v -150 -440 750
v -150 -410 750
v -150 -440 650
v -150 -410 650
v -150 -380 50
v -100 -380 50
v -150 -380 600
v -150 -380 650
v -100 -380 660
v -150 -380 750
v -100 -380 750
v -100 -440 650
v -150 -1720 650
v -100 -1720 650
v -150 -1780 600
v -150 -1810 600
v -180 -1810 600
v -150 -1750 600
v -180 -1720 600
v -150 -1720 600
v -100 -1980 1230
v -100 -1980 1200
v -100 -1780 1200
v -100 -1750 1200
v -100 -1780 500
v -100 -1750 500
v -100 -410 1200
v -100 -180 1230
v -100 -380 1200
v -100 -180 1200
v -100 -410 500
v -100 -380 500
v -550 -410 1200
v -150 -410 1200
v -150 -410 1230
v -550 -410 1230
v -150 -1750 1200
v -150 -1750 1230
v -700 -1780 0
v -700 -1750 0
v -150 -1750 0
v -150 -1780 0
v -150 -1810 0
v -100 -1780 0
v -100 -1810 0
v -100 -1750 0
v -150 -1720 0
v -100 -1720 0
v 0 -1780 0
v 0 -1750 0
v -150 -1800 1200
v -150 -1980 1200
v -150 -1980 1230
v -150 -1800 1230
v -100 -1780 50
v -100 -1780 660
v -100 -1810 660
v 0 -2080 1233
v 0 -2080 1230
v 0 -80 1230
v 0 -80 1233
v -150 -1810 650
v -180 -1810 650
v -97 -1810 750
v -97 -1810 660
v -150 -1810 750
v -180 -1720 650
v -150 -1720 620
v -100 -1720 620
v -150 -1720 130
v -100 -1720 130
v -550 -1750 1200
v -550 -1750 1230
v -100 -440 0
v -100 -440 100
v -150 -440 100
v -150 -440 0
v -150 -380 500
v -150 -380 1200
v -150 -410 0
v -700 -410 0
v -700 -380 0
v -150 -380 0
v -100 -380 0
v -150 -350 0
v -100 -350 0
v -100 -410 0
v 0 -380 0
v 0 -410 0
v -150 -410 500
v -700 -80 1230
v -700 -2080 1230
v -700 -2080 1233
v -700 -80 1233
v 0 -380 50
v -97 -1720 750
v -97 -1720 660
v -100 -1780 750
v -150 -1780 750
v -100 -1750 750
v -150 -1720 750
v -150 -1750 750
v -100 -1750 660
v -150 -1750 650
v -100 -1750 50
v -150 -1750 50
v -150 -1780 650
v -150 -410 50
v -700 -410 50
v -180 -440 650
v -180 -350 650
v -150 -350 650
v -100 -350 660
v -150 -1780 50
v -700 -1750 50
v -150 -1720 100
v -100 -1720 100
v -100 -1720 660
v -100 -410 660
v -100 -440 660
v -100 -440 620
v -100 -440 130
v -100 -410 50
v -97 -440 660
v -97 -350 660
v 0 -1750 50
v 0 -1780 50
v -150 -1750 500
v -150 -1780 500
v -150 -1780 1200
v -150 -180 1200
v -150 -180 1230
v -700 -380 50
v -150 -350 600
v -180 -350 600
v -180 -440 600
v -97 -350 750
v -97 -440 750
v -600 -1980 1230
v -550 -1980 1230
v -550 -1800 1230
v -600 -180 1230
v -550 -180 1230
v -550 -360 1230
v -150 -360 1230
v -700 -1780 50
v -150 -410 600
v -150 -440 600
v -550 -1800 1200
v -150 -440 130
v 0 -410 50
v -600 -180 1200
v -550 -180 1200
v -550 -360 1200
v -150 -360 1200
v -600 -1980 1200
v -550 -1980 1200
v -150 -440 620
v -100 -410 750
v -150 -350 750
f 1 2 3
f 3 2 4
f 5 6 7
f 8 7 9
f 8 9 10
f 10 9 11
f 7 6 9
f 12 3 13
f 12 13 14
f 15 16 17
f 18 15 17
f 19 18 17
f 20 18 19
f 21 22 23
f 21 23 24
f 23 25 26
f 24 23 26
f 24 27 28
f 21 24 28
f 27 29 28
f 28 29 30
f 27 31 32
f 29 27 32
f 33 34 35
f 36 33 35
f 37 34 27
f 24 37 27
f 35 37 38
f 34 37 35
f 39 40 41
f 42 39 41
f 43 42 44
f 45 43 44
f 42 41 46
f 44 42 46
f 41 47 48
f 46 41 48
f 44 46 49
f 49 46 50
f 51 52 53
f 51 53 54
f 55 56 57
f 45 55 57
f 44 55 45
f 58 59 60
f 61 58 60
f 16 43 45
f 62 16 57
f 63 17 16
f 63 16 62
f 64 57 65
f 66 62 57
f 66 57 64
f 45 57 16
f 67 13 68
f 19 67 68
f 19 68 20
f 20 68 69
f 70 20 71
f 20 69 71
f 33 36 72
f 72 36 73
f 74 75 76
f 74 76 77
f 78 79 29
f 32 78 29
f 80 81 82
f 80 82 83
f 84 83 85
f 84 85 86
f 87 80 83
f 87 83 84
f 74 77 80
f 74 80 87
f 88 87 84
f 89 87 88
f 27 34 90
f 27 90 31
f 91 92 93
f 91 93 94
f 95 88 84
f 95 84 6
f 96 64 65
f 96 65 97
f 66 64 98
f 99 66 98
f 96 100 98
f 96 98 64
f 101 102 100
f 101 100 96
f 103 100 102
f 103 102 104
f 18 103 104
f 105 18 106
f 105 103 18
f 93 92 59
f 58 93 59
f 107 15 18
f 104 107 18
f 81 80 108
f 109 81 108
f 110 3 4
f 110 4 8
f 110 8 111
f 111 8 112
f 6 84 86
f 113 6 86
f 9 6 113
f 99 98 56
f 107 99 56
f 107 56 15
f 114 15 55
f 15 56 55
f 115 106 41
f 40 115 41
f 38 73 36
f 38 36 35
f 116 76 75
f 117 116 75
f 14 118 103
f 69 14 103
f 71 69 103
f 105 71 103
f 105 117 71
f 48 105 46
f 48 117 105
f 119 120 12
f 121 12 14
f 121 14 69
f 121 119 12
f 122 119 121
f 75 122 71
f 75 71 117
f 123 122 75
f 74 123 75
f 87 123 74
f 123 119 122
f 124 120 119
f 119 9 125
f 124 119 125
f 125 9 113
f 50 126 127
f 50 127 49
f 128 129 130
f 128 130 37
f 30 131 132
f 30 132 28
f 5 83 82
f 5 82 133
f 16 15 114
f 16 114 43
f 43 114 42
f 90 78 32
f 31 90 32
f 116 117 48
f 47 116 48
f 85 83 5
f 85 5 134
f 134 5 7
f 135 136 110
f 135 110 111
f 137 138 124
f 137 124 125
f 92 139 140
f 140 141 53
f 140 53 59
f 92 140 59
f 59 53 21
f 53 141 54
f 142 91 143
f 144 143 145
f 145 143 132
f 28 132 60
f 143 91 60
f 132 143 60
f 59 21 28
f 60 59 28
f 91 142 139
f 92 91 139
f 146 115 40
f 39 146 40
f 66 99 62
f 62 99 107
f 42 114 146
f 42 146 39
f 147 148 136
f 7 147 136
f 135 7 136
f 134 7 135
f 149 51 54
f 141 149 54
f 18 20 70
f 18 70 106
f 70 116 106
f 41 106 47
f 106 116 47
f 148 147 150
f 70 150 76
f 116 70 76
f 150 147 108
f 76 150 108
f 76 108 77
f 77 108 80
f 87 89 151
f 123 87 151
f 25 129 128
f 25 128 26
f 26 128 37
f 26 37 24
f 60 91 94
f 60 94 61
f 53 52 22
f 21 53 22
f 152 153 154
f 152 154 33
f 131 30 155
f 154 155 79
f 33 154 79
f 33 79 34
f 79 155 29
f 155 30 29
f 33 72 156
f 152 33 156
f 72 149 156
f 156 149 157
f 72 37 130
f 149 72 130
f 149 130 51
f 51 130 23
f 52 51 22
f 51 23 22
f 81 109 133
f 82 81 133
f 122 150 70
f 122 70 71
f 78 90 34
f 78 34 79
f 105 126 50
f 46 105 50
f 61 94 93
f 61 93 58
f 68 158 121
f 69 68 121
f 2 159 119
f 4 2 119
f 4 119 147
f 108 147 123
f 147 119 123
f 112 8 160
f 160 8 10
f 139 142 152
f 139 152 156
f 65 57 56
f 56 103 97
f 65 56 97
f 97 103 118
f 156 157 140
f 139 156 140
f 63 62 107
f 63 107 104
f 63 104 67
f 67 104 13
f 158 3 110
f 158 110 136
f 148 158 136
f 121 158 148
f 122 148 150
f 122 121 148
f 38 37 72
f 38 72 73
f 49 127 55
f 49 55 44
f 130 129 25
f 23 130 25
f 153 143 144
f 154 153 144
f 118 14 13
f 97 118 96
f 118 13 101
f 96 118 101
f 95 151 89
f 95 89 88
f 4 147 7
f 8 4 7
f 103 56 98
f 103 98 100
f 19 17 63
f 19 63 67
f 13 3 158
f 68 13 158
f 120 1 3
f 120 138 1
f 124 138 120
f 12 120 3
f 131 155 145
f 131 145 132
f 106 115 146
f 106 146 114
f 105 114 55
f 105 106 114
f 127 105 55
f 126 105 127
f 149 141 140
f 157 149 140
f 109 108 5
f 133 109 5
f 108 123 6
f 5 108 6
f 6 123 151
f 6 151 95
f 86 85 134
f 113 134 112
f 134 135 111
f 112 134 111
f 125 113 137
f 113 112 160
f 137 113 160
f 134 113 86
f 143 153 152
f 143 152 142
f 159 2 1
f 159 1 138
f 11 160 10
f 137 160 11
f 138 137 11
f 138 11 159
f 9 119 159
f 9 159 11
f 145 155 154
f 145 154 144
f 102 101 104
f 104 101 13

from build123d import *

# Parameters (mm, degrees)
SKETCH001_W  = 30
SKETCH001_H  = 50
PAD_DEPTH    = 700
SKETCH002_W  = 750
SKETCH002_H  = 50
PAD001_DEPTH = 30
SKETCH003_W  = 750
SKETCH003_H  = 50
PAD002_DEPTH = 30
SKETCH004_W  = 30
SKETCH004_H  = 50
PAD003_DEPTH = 1280
SKETCH005_W  = 750
SKETCH005_H  = 50
PAD004_DEPTH = 30
SKETCH006_W  = 50
SKETCH006_H  = 700
PAD005_DEPTH = 30
SKETCH007_W  = 750
SKETCH007_H  = 50
PAD006_DEPTH = 30
SKETCH008_W  = 90
SKETCH008_H  = 50
PAD007_DEPTH = 30
SKETCH009_W  = 90
SKETCH009_H  = 90
PAD008_DEPTH = 3
SKETCH010_W  = 50
SKETCH010_H  = 30
PAD009_DEPTH = 700
SKETCH011_W  = 50
SKETCH011_H  = 1800
PAD010_DEPTH = 30
SKETCH012_W  = 50
SKETCH012_H  = 30
PAD011_DEPTH = 700
SKETCH013_W  = 50
SKETCH013_H  = 30
PAD012_DEPTH = 400
SKETCH014_W  = 1800
SKETCH014_H  = 30
PAD013_DEPTH = 50
SKETCH015_W  = 700
SKETCH015_H  = 2000
PAD014_DEPTH = 3


with BuildPart() as partedebaixo:
    # Sketch001 → Pad (new body)
    with BuildSketch(Plane.YZ):
        with Locations((-395, 25)):
            Rectangle(SKETCH001_W, SKETCH001_H)
    extrude(amount=-PAD_DEPTH)

    # Sketch002 (on Face4 of Pad) → Pad001 (join)
    with BuildSketch(Plane(origin=(0, -410, 0), x_dir=(0, 0, -1), z_dir=(0, -1, 0))):
        with Locations((-375, -125)):
            Rectangle(SKETCH002_W, SKETCH002_H)
    extrude(amount=PAD001_DEPTH)

    # Sketch003 (on Face5 of Pad001) → Pad002 (join)
    with BuildSketch(Plane.ZX.offset(-380)):
        with Locations((375, -125)):
            Rectangle(SKETCH003_W, SKETCH003_H)
    extrude(amount=PAD002_DEPTH)

    # Sketch004 (on Face18 of Pad002) → Pad003 (join)
    with BuildSketch(Plane(origin=(0, -440, 0), x_dir=(0, 0, -1), z_dir=(0, -1, 0))):
        with Locations((-115, -125)):
            Rectangle(SKETCH004_W, SKETCH004_H)
        with Locations((-635, -125)):
            Rectangle(SKETCH004_W, SKETCH004_H)
    extrude(amount=PAD003_DEPTH)

    # Sketch005 (on Face29 of Pad003) → Pad004 (join)
    with BuildSketch(Plane(origin=(0, -1720, 0), x_dir=(0, 0, -1), z_dir=(0, -1, 0))):
        with Locations((-375, -125)):
            Rectangle(SKETCH005_W, SKETCH005_H)
    extrude(amount=PAD004_DEPTH)

    # Sketch006 (on Face9 of Pad004) → Pad005 (join)
    with BuildSketch(Plane(origin=(0, -1750, 0), x_dir=(0, 0, -1), z_dir=(0, -1, 0))):
        with Locations((-25, -350)):
            Rectangle(SKETCH006_W, SKETCH006_H)
    extrude(amount=PAD005_DEPTH)

    # Sketch007 (on Face24 of Pad005) → Pad006 (join)
    with BuildSketch(Plane(origin=(0, -1780, 0), x_dir=(0, 0, -1), z_dir=(0, -1, 0))):
        with Locations((-375, -125)):
            Rectangle(SKETCH007_W, SKETCH007_H)
    extrude(amount=PAD006_DEPTH)

    # Sketch008 (on Face50 of Pad006) → Pad007 (join)
    with BuildSketch(Plane(origin=(-150, 0, 0), x_dir=(0, 1, 0), z_dir=(-1, 0, 0))):
        with Locations((-1765, -625)):
            Rectangle(SKETCH008_W, SKETCH008_H)
        with Locations((-395, -625)):
            Rectangle(SKETCH008_W, SKETCH008_H)
    extrude(amount=PAD007_DEPTH)

    # Sketch009 (on Face45 of Pad007) → Pad008 (join)
    with BuildSketch(Plane.YZ.offset(-100)):
        with Locations((-1765, 705)):
            Rectangle(SKETCH009_W, SKETCH009_H)
        with Locations((-395, 705)):
            Rectangle(SKETCH009_W, SKETCH009_H)
    extrude(amount=PAD008_DEPTH)


with BuildPart() as partedecima:
    # Sketch010 → Pad009 (new body)
    with BuildSketch(Plane.XY.offset(500)):
        with Locations((-125, -395)):
            Rectangle(SKETCH010_W, SKETCH010_H)
    extrude(amount=PAD009_DEPTH)

    # Sketch011 (on Face6 of Pad009) → Pad010 (join)
    with BuildSketch(Plane.XY.offset(1200)):
        with Locations((-125, -1080)):
            Rectangle(SKETCH011_W, SKETCH011_H)
    extrude(amount=PAD010_DEPTH)

    # Sketch012 (on Face7 of Pad010) → Pad011 (join)
    with BuildSketch(Plane(origin=(0, 0, 1200), x_dir=(1, 0, 0), z_dir=(0, 0, -1))):
        with Locations((-125, 1765)):
            Rectangle(SKETCH012_W, SKETCH012_H)
    extrude(amount=PAD011_DEPTH)

    # Sketch013 (on Face2 of Pad011) → Pad012 (join)
    with BuildSketch(Plane(origin=(-150, 0, 0), x_dir=(0, -1, 0), z_dir=(-1, 0, 0))):
        with Locations((385, 1215)):
            Rectangle(SKETCH013_W, SKETCH013_H)
        with Locations((1775, 1215)):
            Rectangle(SKETCH013_W, SKETCH013_H)
    extrude(amount=PAD012_DEPTH)

    # Sketch014 (on Face18 of Pad012) → Pad013 (join)
    with BuildSketch(Plane(origin=(-550, 0, 0), x_dir=(0, -1, 0), z_dir=(-1, 0, 0))):
        with Locations((1080, 1215)):
            Rectangle(SKETCH014_W, SKETCH014_H)
    extrude(amount=PAD013_DEPTH)

    # Sketch015 (on Face1 of Pad013) → Pad014 (join)
    with BuildSketch(Plane.XY.offset(1230)):
        with Locations((-350, -1080)):
            Rectangle(SKETCH015_W, SKETCH015_H)
    extrude(amount=PAD014_DEPTH)


solid = Compound([partedebaixo.part, partedecima.part])
